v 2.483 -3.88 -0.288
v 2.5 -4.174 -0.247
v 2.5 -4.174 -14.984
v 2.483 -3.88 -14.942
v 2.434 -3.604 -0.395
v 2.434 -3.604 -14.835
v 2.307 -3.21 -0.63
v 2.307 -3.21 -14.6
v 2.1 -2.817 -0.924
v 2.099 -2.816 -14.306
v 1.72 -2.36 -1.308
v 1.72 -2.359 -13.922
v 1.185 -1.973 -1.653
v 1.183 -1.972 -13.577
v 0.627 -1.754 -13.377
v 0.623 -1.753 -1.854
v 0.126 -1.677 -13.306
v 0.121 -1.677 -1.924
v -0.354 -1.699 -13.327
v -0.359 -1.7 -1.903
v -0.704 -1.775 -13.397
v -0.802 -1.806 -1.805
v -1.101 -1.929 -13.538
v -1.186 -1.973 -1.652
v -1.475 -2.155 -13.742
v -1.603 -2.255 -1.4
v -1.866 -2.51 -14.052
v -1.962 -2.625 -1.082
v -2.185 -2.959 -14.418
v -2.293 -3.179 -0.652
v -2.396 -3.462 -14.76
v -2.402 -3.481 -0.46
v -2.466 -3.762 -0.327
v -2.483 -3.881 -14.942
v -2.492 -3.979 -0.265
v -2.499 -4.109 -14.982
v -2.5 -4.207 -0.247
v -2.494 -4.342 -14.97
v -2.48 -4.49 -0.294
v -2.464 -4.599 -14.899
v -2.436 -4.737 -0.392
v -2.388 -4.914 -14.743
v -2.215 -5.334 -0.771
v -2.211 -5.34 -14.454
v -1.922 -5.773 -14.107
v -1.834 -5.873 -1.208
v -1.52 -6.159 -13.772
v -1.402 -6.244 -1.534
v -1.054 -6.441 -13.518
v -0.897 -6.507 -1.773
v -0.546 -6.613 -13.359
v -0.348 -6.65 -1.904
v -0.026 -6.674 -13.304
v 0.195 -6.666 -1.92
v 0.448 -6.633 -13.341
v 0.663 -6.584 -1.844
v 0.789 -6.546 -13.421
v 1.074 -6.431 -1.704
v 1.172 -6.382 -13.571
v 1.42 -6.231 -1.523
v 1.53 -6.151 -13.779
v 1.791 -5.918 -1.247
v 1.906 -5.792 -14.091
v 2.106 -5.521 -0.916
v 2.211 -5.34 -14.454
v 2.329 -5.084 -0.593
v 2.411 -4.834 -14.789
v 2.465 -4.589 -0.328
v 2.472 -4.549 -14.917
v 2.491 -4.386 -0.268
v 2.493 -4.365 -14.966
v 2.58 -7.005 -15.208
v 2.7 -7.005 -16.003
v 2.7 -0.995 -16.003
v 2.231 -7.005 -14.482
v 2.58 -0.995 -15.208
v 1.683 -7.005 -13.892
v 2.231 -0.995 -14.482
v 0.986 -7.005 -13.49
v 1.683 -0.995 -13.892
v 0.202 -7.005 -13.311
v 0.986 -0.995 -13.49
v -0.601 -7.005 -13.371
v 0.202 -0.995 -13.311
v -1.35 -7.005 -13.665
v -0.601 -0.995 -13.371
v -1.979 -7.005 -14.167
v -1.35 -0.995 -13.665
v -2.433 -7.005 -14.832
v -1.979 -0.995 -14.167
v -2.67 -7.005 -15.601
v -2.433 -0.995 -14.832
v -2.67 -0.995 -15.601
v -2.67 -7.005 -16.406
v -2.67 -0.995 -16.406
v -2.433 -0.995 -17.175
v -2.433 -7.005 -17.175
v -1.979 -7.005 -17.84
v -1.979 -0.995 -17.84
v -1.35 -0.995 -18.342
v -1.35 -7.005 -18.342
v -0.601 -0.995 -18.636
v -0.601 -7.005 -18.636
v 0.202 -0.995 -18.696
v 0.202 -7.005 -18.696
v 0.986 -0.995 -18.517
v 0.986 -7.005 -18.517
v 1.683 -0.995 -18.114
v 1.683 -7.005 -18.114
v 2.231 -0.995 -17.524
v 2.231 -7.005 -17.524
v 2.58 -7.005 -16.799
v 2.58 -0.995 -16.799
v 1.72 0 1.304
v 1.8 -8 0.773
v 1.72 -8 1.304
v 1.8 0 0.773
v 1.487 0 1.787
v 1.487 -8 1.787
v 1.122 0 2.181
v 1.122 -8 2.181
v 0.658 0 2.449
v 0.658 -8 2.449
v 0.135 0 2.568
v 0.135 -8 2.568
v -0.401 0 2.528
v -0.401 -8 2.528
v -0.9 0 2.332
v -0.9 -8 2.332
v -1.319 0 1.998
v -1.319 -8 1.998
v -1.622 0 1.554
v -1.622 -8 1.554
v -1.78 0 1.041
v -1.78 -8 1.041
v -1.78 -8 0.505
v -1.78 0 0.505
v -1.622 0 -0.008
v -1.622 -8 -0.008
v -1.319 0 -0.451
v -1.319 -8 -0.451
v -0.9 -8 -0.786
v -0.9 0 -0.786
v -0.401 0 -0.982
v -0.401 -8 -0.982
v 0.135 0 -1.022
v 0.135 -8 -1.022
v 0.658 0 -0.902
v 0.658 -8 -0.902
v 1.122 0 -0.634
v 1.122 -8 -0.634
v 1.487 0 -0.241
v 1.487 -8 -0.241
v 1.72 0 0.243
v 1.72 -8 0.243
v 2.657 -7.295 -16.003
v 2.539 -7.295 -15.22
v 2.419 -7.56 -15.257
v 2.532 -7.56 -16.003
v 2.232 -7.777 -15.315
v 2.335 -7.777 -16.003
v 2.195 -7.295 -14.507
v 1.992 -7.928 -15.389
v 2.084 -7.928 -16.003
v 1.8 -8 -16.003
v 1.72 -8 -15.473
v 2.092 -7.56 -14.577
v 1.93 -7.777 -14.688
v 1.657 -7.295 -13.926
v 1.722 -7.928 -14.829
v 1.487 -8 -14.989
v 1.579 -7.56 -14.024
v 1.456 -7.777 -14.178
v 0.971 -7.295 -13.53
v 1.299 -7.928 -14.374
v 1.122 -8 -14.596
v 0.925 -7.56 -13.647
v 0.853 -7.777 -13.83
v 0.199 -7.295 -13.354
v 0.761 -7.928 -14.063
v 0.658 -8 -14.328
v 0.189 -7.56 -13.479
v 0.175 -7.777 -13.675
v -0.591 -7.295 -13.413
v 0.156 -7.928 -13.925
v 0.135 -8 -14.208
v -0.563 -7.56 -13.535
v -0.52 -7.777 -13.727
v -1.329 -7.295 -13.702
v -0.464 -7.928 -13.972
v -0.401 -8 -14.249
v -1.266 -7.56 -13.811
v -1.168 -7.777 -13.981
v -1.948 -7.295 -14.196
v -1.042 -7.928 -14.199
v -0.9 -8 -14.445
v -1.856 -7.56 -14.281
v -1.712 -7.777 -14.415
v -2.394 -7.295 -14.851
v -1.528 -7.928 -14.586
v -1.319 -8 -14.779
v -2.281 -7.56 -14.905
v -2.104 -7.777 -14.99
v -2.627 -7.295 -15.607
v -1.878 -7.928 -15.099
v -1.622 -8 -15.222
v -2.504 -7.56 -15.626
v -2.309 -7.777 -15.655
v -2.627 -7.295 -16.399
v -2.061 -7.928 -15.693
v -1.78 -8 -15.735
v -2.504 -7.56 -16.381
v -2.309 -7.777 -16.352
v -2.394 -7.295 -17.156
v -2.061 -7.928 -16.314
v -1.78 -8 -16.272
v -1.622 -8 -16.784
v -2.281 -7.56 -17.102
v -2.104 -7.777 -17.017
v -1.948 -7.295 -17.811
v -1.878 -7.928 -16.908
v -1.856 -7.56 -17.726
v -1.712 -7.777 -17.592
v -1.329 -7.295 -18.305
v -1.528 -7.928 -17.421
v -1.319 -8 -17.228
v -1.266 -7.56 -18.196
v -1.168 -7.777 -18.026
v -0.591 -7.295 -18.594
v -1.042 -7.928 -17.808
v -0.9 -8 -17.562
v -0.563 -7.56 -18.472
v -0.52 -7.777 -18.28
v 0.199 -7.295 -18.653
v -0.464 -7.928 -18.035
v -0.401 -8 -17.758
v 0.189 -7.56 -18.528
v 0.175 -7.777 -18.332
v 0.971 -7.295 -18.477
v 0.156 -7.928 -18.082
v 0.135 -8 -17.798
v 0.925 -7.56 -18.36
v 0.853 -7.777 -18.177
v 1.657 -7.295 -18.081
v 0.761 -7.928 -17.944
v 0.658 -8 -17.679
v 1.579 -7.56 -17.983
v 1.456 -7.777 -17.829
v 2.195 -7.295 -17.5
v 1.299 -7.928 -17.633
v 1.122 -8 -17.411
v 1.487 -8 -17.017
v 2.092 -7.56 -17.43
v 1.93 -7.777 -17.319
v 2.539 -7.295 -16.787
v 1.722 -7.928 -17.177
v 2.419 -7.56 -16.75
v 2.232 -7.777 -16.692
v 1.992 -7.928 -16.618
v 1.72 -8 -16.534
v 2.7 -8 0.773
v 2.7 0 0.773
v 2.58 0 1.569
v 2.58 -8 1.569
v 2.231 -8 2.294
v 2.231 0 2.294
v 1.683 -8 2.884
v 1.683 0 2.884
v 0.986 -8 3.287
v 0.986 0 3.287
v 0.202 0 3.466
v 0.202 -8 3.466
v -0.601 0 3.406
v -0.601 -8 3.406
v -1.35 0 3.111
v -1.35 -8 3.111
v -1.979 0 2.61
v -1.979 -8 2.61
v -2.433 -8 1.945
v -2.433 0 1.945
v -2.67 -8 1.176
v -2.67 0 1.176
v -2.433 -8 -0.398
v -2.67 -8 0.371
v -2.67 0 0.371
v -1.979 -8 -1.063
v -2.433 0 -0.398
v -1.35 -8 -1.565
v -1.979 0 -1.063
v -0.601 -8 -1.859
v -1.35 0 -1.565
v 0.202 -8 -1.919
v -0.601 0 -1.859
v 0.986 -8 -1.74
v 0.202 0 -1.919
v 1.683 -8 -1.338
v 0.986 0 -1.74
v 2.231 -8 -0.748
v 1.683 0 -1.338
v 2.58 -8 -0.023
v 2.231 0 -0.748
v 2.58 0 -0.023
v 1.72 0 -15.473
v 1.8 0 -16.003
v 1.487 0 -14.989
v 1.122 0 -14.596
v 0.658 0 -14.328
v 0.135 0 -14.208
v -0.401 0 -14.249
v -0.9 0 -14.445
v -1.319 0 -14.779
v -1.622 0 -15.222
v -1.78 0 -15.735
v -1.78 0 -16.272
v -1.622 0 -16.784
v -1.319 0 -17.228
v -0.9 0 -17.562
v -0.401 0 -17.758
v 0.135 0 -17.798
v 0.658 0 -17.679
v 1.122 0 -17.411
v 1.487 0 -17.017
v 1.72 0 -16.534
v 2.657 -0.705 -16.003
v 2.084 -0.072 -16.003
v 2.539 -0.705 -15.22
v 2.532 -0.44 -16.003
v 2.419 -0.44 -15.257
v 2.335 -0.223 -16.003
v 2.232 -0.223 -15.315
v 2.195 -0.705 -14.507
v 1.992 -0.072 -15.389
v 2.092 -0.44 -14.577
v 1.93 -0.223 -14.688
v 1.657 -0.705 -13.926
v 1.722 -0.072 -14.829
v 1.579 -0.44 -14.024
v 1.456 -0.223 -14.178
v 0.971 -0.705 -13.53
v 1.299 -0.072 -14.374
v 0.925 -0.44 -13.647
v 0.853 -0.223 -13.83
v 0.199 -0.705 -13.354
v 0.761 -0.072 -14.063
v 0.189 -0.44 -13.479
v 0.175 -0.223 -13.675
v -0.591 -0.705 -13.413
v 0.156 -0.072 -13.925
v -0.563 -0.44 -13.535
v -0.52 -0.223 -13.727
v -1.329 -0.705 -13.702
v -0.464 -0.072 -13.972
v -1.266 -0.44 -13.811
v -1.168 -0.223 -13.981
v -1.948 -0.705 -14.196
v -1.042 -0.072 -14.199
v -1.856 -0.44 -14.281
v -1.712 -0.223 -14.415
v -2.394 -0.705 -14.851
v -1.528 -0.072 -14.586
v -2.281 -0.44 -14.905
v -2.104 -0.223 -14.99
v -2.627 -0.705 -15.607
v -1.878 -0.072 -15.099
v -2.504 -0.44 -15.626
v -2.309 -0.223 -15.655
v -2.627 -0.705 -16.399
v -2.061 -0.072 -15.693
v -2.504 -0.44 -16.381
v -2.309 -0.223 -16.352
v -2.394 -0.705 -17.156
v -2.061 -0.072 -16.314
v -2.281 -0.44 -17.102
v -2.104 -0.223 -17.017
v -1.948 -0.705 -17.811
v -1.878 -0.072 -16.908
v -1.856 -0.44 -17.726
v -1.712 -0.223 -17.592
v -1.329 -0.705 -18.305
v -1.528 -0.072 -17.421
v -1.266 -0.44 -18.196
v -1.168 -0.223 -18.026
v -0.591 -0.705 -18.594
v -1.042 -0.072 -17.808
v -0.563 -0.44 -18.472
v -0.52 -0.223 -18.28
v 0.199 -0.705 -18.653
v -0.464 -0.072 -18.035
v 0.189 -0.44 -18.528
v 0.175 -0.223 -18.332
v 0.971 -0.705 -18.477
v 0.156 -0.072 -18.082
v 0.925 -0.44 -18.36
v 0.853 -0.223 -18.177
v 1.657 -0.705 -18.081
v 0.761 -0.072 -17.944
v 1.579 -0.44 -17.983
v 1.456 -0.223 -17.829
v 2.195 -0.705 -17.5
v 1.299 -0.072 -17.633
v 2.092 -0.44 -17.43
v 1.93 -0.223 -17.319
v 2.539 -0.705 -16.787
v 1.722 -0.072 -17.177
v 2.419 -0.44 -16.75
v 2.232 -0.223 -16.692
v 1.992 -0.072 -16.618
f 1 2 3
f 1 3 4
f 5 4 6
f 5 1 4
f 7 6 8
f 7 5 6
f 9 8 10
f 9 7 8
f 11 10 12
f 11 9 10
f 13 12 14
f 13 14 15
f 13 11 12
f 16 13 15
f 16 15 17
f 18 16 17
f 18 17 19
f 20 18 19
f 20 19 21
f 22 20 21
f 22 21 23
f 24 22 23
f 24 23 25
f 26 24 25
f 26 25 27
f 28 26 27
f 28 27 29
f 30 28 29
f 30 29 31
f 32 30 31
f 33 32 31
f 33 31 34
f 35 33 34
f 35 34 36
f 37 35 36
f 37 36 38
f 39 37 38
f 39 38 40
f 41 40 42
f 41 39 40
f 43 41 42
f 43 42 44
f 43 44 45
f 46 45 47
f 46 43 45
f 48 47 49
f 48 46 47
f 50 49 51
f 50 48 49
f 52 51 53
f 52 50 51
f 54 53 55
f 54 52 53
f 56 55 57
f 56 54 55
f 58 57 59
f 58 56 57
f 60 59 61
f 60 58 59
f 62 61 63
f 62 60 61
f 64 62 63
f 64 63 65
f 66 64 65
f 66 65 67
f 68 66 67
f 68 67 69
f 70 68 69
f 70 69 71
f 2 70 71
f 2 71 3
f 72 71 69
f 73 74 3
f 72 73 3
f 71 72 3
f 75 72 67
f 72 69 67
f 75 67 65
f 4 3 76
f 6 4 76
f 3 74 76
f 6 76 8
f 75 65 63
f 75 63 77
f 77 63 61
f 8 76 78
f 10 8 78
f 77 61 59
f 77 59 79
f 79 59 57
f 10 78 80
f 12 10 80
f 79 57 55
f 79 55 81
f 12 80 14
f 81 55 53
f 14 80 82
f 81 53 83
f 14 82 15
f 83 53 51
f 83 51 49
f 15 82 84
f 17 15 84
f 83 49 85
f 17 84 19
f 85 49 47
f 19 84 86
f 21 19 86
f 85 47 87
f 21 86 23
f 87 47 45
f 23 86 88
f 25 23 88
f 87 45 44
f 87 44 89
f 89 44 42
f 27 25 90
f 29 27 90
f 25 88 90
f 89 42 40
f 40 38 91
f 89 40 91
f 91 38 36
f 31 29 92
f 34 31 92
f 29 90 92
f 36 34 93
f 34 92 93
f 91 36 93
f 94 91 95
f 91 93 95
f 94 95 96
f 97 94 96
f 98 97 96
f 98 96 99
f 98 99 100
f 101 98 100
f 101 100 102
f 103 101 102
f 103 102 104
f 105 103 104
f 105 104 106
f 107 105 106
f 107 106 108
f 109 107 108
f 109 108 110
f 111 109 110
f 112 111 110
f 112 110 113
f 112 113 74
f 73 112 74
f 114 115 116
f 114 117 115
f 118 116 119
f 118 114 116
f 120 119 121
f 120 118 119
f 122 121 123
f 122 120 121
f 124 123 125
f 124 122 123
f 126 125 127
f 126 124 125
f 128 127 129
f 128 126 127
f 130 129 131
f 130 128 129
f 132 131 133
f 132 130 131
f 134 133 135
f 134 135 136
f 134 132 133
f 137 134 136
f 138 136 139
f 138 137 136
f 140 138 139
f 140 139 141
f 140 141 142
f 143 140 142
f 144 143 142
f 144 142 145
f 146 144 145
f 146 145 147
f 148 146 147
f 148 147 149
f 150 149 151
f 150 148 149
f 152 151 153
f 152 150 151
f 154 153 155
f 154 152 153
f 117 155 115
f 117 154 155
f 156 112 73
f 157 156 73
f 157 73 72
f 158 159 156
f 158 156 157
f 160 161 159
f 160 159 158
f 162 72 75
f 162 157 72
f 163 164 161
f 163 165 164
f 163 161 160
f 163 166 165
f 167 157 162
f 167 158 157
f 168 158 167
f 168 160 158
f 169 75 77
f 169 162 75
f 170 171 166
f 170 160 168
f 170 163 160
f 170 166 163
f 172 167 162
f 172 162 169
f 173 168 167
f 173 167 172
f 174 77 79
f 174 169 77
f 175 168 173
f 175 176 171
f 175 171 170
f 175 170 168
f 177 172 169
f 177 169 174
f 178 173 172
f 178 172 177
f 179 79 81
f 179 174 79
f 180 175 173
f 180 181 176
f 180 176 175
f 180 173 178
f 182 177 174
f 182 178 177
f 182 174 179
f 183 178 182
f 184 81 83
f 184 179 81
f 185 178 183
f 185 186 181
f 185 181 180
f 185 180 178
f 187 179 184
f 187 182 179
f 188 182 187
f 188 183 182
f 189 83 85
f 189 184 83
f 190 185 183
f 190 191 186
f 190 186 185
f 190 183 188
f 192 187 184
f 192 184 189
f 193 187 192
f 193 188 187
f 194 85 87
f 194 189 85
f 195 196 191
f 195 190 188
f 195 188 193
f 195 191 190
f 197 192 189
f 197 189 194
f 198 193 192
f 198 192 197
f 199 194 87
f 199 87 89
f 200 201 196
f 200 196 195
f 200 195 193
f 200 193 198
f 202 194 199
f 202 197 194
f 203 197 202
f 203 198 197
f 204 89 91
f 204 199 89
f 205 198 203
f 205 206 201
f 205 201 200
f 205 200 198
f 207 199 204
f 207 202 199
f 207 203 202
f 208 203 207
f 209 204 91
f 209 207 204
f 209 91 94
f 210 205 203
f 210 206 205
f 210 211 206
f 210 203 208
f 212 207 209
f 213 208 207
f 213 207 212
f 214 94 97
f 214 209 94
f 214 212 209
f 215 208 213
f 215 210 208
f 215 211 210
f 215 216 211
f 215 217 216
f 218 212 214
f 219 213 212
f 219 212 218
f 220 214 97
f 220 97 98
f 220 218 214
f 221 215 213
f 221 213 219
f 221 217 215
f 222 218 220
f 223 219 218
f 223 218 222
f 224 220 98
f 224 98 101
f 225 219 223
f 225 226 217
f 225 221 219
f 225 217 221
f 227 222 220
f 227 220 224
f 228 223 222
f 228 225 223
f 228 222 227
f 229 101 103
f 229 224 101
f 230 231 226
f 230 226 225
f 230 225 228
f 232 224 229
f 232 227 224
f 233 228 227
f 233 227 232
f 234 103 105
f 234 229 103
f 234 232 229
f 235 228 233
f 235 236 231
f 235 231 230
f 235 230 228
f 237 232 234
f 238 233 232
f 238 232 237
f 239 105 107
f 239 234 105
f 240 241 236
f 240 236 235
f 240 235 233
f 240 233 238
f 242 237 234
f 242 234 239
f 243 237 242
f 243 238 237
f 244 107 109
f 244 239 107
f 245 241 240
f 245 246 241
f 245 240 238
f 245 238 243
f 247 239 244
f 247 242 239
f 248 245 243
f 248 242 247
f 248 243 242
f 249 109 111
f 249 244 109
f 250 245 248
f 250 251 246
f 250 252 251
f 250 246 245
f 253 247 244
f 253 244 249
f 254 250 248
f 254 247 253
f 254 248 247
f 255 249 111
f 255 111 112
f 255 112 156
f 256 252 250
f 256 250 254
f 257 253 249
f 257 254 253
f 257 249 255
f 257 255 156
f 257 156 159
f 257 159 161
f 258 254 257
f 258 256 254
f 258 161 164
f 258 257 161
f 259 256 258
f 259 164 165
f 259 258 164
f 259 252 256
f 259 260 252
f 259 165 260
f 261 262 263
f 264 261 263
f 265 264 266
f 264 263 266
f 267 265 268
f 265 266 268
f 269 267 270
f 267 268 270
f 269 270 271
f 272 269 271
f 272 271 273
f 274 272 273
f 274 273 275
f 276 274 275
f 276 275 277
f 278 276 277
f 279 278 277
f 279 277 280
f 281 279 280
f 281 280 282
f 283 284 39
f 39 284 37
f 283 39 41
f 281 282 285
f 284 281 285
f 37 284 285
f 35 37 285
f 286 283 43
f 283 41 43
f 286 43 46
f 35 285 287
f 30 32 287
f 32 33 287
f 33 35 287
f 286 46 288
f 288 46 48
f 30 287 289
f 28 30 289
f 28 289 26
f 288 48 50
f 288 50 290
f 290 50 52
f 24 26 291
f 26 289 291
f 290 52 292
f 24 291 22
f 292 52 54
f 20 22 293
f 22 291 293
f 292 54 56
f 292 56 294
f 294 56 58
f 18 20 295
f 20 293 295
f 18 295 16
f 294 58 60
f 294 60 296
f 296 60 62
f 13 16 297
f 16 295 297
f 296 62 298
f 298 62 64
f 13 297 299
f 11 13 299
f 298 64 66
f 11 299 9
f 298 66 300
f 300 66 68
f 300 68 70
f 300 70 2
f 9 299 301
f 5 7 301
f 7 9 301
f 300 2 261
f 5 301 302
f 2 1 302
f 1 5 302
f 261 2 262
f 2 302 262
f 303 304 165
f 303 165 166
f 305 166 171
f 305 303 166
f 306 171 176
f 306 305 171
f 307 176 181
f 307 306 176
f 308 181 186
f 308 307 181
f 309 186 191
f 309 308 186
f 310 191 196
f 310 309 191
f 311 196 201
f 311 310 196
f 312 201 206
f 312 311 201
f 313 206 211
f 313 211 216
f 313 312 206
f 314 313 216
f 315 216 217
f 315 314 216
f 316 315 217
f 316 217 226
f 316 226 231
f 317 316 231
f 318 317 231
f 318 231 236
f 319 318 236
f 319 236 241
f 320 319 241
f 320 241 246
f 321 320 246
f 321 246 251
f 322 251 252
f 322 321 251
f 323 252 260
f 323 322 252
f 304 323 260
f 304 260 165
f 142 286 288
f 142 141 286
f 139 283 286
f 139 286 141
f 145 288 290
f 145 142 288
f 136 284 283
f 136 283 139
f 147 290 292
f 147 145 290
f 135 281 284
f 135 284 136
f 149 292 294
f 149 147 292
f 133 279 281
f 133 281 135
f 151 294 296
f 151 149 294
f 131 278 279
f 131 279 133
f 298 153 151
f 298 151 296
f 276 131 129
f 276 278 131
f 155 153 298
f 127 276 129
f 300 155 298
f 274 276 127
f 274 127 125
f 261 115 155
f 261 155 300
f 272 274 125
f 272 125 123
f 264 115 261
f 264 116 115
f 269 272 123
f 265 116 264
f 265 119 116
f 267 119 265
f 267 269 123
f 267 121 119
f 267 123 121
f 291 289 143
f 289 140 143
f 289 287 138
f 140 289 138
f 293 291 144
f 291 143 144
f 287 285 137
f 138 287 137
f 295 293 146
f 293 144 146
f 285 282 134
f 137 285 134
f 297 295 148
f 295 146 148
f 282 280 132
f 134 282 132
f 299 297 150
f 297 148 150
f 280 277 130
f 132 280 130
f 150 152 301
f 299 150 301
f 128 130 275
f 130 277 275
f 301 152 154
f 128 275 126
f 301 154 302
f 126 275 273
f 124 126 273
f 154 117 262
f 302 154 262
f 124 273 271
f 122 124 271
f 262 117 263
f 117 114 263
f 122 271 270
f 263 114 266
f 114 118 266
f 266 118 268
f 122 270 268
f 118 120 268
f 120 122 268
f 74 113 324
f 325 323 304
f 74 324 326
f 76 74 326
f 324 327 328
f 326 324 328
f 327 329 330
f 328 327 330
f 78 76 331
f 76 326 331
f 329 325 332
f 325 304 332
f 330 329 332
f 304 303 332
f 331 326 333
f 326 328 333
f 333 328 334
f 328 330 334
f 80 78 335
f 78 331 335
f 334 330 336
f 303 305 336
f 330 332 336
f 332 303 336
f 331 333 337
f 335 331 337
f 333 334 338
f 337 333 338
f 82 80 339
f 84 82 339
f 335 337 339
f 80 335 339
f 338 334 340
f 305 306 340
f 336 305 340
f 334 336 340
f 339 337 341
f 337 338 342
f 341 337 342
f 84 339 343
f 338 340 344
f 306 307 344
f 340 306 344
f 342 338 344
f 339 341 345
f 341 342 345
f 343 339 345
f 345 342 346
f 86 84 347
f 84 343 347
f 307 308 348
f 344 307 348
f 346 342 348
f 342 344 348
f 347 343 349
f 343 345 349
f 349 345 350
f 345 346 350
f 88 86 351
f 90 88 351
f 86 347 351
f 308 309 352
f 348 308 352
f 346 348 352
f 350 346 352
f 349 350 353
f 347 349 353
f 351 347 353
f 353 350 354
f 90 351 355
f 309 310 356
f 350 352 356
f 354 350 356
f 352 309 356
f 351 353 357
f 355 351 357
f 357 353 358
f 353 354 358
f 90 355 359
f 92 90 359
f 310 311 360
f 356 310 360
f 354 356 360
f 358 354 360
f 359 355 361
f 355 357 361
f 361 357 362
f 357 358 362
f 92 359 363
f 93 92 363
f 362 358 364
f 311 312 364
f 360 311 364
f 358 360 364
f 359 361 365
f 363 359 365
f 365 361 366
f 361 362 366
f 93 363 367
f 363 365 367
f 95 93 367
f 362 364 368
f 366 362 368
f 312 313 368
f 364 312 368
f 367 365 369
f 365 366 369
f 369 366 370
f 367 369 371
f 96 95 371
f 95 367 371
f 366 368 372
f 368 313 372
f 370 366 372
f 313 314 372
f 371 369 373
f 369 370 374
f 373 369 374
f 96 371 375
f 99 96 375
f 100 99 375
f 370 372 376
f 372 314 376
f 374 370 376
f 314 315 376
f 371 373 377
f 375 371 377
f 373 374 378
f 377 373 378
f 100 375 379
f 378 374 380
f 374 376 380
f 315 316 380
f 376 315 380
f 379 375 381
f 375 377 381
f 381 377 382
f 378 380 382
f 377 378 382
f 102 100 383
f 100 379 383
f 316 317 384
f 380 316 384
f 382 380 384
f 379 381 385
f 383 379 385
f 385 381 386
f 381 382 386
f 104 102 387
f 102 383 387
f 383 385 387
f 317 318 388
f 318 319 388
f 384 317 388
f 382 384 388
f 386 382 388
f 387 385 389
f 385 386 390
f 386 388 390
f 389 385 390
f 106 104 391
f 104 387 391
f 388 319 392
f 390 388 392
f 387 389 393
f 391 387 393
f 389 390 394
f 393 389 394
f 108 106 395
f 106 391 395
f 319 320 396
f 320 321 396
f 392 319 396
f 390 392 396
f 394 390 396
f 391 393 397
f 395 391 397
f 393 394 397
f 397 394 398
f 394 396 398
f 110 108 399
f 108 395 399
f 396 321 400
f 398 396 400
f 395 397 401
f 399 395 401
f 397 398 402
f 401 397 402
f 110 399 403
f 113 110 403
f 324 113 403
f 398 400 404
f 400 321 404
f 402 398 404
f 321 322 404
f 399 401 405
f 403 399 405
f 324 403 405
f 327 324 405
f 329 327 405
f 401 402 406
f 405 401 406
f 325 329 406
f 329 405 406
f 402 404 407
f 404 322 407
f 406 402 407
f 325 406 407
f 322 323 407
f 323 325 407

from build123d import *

# Parameters (mm, degrees)
F0_R     = 2.7
F0_R_2   = 1.8
F1_DEPTH = 8
F2_R     = 2.5
F3_DEPTH = 16
F4_DEPTH = 25
F5_R     = 2.7
F5_R_2   = 1.8
F6_DEPTH = 8
F7_DEPTH = 25


# Not quite as in the source:
# - a fillet or chamfer that OpenCascade refuses, or shapes differently, is made with other operations: its cross-section is extruded or revolved along the edge and cut away or added


with BuildPart() as f1:
    # F0 (on Front) → F1 (new body)
    with BuildSketch(Plane.XZ):
        with Locations((0, 0.773217123)):
            Circle(F0_R)
        with Locations((0, 0.773217123)):
            Circle(F0_R_2, mode=Mode.SUBTRACT)
    extrude(amount=F1_DEPTH)

    # F2 (on Top) → F3 (join)
    with BuildSketch(Plane.XY):
        with Locations((0, -4.1738846339)):
            Circle(F2_R)
    extrude(amount=-F3_DEPTH)

    # F0 (on Front) → F4 (cut)
    with BuildSketch(Plane.XZ):
        with Locations((0, 0.773217123)):
            Circle(F0_R_2)
    extrude(amount=F4_DEPTH, mode=Mode.SUBTRACT)

    # F5 (on Front) → F6 (join, through all)
    with BuildSketch(Plane.XZ):
        with Locations((0, -16.0034396241)):
            Circle(F5_R)
        with Locations((0, -16.0034396241)):
            Circle(F5_R_2, mode=Mode.SUBTRACT)
    extrude(amount=F6_DEPTH)

    # F5 (on Front) → F7 (cut)
    with BuildSketch(Plane.XZ):
        with Locations((0, -16.0034396241)):
            Circle(F5_R_2)
    extrude(amount=F7_DEPTH, mode=Mode.SUBTRACT)

    # F8: fillet of radius 1 on 1 edges, made by hand

    # F8_s1 → F8_t2 (revolve, cut)
    with BuildSketch(Plane.XY.offset(-16.0034396241)):
        with BuildLine():
            ThreePointArc((2.7, -0.9949874371), (2.4416198487, -0.3241670439), (1.8, 0))
            Line((1.8, 0), (2.7, 0))
            Line((2.7, 0), (2.7, -0.9949874371))
        make_face()
    revolve(axis=Axis((0, 0, -16.0034396241), (0, -1, 0)), mode=Mode.SUBTRACT)

    # F9: fillet of radius 1 on 1 edges, made by hand

    # F9_s1 → F9_t2 (revolve, cut)
    with BuildSketch(Plane.XY.offset(-16.0034396241)):
        with BuildLine():
            ThreePointArc((2.7, -7.0050125629), (2.4416198487, -7.6758329561), (1.8, -8))
            Line((1.8, -8), (2.7, -8))
            Line((2.7, -8), (2.7, -7.0050125629))
        make_face()
    revolve(axis=Axis((0, -8, -16.0034396241), (0, -1, 0)), mode=Mode.SUBTRACT)


solid = f1.part
